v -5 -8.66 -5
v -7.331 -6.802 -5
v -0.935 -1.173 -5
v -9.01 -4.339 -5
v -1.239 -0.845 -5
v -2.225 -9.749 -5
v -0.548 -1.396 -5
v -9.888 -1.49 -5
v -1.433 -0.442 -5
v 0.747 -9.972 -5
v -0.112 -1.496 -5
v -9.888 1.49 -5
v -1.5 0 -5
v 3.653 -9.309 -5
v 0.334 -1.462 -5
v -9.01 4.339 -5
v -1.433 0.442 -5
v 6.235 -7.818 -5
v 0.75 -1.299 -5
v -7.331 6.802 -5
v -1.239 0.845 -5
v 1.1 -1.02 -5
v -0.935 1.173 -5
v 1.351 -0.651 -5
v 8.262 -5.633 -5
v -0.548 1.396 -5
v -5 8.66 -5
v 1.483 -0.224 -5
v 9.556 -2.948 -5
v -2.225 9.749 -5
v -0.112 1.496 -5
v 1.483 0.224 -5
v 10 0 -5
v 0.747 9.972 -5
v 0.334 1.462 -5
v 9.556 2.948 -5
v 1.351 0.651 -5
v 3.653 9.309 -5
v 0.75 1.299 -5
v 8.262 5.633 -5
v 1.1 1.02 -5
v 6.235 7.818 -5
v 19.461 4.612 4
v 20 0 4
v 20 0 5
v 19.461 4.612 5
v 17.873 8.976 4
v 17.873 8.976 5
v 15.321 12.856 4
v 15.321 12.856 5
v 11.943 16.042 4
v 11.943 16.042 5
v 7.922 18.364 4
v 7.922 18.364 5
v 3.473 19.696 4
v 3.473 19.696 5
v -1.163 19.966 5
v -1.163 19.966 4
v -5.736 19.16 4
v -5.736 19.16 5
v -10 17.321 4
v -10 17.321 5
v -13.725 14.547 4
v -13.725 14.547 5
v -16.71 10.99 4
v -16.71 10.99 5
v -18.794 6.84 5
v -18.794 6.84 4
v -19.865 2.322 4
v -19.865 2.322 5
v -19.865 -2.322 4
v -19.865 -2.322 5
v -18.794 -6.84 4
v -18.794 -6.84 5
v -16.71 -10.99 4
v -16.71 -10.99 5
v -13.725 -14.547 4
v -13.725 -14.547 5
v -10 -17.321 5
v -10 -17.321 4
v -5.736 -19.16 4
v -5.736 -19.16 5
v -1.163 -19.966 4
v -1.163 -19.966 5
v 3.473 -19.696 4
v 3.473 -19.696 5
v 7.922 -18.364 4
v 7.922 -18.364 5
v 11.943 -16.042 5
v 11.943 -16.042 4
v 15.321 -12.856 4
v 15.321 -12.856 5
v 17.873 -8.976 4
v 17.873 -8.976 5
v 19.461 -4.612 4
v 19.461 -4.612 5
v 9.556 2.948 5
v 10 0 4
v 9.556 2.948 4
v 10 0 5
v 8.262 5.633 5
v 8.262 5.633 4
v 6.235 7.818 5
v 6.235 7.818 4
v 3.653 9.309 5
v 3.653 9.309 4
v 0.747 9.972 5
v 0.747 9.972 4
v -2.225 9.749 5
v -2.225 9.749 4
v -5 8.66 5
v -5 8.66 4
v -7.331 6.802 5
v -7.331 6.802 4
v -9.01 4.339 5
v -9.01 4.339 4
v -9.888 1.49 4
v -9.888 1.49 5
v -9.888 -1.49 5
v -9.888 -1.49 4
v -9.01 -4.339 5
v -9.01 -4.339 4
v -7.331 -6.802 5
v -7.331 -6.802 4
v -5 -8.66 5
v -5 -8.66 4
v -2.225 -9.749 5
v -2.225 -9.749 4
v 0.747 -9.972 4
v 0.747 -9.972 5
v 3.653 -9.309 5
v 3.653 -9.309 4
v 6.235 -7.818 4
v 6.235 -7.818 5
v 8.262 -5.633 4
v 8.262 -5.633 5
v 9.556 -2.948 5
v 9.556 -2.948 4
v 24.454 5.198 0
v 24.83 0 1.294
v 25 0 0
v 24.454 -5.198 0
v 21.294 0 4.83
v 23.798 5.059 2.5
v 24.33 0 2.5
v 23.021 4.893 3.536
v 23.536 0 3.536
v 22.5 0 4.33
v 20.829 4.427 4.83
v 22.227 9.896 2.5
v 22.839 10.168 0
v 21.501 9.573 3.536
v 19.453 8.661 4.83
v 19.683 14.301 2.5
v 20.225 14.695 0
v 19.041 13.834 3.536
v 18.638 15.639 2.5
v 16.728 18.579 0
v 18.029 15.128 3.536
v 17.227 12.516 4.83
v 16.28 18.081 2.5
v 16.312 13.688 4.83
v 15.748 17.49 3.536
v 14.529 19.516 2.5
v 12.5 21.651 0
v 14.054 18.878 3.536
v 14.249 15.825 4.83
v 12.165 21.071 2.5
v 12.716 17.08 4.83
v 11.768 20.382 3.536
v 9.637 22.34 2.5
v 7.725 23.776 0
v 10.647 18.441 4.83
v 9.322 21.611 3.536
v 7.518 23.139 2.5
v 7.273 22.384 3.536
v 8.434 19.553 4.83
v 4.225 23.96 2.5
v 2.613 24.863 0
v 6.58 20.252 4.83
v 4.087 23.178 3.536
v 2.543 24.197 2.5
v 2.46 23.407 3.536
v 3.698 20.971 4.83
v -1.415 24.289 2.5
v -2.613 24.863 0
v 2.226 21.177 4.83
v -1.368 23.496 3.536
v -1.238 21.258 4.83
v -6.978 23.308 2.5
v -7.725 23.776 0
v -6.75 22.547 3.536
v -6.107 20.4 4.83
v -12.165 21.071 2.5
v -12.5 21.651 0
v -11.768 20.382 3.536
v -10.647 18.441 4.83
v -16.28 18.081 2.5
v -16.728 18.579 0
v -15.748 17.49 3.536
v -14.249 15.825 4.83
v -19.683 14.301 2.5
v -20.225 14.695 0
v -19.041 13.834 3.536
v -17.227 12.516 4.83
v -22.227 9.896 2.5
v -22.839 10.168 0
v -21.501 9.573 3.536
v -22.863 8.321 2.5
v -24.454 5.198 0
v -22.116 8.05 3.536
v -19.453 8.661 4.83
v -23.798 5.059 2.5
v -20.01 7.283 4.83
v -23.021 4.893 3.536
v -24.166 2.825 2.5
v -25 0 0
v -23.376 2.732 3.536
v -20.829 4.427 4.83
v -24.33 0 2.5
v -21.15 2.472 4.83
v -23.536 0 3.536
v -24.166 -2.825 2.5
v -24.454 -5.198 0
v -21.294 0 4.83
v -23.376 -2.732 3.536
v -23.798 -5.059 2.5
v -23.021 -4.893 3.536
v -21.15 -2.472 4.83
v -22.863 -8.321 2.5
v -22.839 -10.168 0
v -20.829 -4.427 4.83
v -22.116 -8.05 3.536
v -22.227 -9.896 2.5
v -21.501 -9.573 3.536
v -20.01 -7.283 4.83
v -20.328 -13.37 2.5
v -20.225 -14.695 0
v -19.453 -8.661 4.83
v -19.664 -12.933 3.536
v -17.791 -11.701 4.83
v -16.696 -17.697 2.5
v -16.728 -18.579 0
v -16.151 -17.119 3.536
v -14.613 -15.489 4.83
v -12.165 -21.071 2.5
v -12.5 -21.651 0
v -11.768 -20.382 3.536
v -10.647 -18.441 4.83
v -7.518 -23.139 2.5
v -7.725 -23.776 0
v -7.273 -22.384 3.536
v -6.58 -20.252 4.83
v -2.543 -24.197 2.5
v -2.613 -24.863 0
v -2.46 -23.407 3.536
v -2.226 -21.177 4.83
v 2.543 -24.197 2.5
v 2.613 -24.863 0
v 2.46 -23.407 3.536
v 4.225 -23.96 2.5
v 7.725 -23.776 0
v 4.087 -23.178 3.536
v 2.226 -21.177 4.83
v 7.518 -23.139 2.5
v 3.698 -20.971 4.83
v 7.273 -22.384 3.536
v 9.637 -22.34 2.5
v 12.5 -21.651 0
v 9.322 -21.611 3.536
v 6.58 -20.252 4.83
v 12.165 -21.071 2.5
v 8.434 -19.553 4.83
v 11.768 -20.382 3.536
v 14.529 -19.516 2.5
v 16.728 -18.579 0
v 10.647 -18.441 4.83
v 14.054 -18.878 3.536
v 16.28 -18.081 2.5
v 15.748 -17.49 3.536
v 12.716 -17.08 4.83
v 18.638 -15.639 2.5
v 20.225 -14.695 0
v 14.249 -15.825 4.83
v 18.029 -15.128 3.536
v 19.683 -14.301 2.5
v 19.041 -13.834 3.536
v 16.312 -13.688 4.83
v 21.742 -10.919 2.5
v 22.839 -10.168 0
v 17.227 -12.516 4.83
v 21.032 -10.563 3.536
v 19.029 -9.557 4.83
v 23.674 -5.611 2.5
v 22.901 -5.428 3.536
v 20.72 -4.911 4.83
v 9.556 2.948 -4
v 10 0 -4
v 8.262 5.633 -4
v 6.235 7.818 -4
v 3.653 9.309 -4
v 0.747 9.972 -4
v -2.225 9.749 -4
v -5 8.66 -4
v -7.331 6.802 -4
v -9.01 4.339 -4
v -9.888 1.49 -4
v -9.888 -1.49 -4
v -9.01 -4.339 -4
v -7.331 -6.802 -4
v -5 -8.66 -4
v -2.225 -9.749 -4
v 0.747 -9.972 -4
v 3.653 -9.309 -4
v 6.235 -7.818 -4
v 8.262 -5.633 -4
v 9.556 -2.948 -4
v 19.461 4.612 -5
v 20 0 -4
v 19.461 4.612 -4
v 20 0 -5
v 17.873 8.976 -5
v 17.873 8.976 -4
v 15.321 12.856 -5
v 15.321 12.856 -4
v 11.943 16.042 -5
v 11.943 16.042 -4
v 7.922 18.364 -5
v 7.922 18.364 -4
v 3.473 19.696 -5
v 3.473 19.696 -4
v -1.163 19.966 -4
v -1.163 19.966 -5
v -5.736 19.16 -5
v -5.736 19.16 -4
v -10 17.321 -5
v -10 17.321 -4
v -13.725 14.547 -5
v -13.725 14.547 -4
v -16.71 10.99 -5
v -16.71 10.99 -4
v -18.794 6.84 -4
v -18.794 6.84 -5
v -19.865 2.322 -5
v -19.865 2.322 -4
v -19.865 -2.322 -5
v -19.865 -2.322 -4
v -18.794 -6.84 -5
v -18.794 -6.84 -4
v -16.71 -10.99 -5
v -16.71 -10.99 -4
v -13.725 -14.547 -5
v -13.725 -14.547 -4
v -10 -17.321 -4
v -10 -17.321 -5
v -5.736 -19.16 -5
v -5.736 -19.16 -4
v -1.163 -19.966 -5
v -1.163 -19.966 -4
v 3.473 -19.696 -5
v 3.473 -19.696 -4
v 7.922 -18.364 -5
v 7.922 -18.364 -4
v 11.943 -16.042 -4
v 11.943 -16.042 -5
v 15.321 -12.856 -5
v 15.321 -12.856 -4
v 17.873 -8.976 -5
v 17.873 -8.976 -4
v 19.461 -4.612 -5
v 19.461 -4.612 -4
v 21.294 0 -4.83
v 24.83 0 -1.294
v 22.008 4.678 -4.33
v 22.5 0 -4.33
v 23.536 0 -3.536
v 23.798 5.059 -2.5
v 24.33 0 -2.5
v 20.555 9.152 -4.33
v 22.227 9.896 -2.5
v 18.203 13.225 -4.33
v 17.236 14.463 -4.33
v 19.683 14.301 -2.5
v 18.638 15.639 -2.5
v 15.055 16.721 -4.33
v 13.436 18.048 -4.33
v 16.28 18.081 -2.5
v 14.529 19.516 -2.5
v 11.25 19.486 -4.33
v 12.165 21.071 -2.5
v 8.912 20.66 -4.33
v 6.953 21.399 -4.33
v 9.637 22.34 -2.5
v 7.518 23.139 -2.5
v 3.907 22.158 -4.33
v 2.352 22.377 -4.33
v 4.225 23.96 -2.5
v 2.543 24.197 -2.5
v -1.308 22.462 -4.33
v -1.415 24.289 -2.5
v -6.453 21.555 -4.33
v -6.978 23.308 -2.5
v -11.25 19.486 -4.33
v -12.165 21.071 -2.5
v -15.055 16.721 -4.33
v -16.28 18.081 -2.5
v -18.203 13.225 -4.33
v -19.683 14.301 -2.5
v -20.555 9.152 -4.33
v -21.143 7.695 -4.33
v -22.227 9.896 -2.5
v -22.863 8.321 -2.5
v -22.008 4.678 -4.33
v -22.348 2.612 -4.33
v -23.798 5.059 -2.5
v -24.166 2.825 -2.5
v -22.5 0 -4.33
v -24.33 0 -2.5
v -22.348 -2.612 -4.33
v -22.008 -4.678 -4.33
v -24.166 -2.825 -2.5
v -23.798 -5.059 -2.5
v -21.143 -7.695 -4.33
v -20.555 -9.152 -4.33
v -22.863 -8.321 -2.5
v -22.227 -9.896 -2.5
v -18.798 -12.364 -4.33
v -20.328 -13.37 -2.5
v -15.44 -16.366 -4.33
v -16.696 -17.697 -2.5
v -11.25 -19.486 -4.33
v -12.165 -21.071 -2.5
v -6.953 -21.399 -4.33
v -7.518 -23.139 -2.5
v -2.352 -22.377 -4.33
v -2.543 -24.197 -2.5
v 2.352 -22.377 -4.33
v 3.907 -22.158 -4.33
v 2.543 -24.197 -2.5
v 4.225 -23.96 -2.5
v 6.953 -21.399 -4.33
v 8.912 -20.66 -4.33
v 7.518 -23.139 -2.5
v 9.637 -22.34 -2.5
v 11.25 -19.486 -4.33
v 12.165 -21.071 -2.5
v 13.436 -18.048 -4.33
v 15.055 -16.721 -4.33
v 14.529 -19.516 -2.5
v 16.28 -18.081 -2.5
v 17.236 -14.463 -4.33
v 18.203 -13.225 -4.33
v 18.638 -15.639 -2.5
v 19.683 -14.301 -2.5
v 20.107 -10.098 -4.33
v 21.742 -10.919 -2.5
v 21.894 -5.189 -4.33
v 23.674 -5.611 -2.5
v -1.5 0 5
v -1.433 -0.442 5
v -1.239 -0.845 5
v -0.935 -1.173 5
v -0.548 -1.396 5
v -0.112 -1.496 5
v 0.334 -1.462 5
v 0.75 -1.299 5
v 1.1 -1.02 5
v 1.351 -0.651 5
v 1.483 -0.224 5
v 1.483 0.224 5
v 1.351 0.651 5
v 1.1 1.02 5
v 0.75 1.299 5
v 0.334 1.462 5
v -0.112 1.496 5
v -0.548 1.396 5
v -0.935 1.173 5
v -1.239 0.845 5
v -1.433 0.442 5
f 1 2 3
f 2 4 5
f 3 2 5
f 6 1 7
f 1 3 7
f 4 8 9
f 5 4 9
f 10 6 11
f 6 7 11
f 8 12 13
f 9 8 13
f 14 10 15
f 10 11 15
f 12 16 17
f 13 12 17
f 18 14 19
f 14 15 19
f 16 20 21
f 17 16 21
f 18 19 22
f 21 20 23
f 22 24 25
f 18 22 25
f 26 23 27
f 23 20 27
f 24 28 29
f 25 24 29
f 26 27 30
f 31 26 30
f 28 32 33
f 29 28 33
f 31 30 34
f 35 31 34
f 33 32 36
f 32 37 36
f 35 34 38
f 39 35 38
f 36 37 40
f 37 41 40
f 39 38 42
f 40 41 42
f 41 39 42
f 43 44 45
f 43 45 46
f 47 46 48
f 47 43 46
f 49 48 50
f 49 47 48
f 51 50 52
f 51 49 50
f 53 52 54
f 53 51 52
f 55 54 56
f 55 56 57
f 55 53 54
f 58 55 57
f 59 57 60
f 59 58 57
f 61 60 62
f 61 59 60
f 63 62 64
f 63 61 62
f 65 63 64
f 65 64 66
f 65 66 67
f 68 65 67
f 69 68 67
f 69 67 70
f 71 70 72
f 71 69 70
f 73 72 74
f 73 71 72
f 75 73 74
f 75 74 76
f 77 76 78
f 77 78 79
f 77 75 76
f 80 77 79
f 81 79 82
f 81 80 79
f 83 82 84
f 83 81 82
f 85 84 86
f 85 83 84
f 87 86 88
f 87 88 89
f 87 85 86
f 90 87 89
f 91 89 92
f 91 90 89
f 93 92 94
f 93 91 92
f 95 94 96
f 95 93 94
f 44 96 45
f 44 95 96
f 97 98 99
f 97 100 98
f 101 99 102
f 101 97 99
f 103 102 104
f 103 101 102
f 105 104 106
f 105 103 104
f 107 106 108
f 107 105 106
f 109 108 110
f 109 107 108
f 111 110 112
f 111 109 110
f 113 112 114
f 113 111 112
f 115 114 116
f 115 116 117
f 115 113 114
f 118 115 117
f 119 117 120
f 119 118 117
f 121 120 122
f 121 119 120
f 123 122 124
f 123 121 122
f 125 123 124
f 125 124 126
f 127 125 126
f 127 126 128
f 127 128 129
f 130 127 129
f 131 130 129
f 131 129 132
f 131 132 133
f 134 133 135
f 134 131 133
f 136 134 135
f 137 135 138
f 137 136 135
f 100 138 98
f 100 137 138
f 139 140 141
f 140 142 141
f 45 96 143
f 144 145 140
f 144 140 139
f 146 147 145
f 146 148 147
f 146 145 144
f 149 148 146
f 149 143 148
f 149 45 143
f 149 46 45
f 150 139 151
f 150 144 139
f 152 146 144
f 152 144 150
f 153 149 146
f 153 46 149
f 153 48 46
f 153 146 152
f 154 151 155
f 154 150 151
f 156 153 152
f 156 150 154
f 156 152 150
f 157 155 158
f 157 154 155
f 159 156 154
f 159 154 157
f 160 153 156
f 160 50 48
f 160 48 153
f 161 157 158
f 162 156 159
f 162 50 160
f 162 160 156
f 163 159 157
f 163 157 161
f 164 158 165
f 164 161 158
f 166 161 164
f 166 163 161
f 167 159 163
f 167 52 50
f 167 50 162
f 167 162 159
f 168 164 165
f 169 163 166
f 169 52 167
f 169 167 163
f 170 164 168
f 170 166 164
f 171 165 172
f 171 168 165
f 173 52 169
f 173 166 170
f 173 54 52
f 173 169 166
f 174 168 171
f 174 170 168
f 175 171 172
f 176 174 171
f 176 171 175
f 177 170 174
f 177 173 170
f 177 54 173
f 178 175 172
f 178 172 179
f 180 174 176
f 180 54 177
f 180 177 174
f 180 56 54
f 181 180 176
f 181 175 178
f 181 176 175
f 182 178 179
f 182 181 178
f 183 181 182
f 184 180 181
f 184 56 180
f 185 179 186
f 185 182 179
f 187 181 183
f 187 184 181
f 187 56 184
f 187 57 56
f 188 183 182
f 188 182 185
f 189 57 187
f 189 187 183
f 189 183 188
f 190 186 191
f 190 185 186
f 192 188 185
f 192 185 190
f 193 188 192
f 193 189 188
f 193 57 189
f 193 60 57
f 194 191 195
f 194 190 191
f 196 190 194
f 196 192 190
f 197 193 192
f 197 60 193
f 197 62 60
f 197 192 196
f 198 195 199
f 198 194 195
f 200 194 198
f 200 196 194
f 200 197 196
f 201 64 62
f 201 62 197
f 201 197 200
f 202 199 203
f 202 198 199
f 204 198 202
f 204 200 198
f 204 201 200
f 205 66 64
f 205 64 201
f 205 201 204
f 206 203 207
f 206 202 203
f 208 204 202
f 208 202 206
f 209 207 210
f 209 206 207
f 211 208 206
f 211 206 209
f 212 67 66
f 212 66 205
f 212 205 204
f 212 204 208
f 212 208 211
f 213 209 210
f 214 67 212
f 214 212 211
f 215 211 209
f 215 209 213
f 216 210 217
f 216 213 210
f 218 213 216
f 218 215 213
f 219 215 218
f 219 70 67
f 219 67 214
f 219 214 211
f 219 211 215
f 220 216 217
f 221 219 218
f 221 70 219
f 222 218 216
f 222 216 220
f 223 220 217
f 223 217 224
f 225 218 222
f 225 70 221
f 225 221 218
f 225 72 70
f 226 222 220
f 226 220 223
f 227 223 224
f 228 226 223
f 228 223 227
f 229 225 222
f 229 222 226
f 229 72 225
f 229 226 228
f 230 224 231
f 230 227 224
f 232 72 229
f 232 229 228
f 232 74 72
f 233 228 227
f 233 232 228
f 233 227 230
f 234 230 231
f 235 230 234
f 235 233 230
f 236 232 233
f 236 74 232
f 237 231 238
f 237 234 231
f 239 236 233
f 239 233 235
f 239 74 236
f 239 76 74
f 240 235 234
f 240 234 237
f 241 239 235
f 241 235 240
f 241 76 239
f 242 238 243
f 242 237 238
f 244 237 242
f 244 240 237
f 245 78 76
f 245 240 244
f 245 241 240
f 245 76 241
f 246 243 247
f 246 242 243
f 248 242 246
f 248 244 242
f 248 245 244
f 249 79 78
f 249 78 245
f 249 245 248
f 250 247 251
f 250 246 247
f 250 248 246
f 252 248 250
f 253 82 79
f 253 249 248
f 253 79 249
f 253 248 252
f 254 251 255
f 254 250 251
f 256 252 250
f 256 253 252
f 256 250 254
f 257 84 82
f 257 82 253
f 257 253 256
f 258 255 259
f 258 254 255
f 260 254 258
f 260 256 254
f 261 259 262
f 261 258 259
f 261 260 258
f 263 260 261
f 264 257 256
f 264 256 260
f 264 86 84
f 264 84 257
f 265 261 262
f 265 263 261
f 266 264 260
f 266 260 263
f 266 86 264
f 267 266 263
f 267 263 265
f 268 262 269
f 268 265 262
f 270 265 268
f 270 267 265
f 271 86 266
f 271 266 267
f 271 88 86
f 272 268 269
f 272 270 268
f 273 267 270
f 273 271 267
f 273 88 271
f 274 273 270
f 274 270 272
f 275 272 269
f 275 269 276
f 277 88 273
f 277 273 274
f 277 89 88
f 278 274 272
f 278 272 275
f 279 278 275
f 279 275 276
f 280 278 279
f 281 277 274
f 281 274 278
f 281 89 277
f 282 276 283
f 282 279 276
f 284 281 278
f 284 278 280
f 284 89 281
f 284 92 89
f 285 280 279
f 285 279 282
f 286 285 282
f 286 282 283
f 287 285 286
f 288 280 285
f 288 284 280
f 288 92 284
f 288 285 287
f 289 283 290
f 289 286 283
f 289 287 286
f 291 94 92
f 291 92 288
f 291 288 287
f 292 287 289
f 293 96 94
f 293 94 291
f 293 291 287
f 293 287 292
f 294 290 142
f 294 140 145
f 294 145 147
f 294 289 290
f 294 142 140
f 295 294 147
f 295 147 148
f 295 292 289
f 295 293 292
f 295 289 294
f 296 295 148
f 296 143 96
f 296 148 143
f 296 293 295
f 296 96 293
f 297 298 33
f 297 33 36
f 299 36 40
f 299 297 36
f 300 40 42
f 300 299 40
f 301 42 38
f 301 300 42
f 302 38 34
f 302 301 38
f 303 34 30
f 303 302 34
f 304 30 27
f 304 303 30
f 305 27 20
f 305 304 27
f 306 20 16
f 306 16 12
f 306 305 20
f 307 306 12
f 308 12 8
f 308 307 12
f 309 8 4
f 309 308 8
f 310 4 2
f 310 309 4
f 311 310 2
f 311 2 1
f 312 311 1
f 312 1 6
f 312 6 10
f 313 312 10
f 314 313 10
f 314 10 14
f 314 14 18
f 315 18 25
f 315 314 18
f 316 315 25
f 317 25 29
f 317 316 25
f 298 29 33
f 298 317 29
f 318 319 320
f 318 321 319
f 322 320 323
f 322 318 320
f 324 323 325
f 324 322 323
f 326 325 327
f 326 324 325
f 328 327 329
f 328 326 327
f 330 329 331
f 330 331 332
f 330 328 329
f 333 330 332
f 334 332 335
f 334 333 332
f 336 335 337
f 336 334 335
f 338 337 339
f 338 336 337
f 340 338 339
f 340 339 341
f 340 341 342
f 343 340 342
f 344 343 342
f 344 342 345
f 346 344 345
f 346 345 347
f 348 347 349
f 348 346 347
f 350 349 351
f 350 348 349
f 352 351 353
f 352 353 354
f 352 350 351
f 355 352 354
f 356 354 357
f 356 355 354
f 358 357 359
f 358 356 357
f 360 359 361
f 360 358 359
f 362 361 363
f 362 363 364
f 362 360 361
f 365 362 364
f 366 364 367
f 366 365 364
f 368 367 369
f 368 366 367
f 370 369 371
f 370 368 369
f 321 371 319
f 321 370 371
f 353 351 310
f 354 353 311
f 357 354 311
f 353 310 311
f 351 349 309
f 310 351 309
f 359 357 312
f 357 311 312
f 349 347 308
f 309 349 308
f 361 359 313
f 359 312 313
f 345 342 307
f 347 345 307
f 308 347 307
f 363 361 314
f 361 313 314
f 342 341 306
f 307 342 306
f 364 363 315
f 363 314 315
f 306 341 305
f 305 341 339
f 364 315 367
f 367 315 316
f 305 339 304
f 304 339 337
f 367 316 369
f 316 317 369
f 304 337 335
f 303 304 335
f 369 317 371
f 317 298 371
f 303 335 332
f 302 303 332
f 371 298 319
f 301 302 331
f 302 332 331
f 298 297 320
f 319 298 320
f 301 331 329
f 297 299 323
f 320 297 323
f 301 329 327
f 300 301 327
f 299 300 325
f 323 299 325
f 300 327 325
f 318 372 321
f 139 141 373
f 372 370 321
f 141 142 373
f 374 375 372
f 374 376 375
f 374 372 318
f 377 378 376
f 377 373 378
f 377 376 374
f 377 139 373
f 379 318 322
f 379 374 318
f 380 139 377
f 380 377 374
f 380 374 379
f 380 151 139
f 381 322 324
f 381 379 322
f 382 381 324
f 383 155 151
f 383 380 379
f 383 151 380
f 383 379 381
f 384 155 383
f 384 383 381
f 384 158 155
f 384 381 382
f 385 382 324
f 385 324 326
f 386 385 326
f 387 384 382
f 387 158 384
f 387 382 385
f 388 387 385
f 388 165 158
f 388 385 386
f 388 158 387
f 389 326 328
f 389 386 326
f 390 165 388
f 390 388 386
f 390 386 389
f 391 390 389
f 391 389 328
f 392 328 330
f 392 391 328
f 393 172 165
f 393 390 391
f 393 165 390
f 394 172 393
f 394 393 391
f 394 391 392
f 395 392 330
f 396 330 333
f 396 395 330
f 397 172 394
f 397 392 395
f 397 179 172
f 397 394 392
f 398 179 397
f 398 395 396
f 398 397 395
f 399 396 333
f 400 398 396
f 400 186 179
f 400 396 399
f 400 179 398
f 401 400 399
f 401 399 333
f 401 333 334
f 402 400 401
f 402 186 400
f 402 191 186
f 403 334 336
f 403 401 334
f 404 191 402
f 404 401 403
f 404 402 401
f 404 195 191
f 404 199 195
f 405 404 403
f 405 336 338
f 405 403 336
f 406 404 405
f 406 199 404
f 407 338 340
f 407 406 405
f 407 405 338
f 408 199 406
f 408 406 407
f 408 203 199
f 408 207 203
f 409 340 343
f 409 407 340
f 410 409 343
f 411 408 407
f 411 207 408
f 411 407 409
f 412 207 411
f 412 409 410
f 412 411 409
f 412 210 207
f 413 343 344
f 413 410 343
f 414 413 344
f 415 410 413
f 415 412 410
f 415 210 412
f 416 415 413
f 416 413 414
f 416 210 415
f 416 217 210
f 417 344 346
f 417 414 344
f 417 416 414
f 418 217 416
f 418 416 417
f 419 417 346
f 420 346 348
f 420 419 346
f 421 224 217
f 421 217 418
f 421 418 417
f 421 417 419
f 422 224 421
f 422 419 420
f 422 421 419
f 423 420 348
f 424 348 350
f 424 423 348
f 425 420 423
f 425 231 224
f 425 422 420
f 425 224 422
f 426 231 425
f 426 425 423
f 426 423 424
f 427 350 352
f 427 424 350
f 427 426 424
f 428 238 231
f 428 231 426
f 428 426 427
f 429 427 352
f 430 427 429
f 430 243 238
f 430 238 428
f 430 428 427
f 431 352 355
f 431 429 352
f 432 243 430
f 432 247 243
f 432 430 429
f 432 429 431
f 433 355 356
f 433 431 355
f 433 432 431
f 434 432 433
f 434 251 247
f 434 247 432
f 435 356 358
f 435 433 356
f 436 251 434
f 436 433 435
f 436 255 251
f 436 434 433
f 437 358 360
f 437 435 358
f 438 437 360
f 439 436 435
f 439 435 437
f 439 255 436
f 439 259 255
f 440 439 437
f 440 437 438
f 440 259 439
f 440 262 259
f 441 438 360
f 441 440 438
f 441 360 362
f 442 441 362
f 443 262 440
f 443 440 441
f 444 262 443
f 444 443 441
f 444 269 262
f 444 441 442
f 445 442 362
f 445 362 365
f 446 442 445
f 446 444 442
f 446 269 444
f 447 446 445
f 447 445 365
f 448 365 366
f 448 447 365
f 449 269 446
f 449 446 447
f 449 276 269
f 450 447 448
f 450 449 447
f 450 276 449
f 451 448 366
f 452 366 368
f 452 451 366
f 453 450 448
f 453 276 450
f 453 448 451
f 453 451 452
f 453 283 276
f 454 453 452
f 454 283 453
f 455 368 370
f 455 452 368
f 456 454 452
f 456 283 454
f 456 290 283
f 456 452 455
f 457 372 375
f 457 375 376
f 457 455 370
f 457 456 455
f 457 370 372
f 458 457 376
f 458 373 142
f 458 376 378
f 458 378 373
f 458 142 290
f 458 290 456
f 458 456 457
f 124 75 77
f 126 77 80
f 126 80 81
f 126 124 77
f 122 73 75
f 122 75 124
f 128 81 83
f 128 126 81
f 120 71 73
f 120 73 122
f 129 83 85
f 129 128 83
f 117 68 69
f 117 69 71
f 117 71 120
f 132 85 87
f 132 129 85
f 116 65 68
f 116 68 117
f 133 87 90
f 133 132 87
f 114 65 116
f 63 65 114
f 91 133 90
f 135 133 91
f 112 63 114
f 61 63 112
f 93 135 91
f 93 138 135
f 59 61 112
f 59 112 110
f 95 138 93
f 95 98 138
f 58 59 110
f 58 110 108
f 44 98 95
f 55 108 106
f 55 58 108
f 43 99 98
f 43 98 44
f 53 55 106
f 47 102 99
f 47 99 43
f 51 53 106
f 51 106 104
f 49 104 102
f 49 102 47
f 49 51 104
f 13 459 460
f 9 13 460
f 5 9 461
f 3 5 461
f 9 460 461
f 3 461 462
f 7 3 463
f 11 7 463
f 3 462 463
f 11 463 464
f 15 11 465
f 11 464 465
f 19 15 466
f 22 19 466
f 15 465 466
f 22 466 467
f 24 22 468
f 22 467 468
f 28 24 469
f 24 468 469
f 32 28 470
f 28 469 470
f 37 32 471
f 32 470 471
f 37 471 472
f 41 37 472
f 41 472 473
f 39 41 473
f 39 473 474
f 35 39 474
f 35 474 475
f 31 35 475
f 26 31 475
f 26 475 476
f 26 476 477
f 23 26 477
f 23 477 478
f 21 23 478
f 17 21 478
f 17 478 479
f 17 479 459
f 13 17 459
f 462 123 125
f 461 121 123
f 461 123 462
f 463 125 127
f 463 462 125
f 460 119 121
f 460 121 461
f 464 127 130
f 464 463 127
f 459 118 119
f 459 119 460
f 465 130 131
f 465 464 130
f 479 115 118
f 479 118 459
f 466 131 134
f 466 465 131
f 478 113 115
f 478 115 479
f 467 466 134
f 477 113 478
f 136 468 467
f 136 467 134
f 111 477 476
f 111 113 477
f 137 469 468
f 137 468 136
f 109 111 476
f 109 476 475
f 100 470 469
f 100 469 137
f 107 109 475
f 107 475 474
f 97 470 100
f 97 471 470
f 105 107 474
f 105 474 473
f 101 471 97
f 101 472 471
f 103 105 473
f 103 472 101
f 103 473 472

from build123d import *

# Parameters (mm, degrees)
F0_R     = 25
F0_R_2   = 20
F1_DEPTH = 5
F0_R_3   = 10
F2_DEPTH = 4
F3_R     = 4.99999
F5_D     = 3
F5_DEPTH = 250
F5_TIP   = 0.9012909285


# Not quite as in the source:
# - a fillet or chamfer is up to 0.001 mm smaller than in the source, because OpenCascade refuses the exact size


with BuildPart() as f1:
    # F0 (on Top) → F1 (new body, symmetric)
    with BuildSketch(Plane.XY):
        Circle(F0_R)
        Circle(F0_R_2, mode=Mode.SUBTRACT)
    extrude(amount=F1_DEPTH, both=True)



with BuildPart() as f1b:
    # F0 (on Top) → F1, piece 2 (new body, symmetric)
    with BuildSketch(Plane.XY):
        Circle(F0_R_3)
    extrude(amount=F1_DEPTH, both=True)


with BuildPart() as f1_1:
    add(f1.part)

    add(f1b.part)  # F2 merges F1b
    # F0 (on Top) → F2 (join, symmetric)
    with BuildSketch(Plane.XY):
        Circle(F0_R_2)
        Circle(F0_R_3, mode=Mode.SUBTRACT)
    extrude(amount=F2_DEPTH, both=True)

    # F3 (radius 5 in the source; OpenCascade refuses exactly that, so slightly less here)
    f3_edges = [f1_1.edges().sort_by_distance(p)[0] for p in [
        (-25, 0, 5),
        (-25, 0, -5),
    ]]
    fillet(f3_edges, radius=F3_R)

    # F5
    with Locations(Plane(origin=(0, 0, -5), x_dir=(1, 0, 0), z_dir=(0, 0, -1))):
        with Locations((0, 0)):
            Hole(F5_D / 2, depth=F5_DEPTH)
            with Locations((0, 0, -(F5_DEPTH + F5_TIP / 2))):  # 118° drill point
                Cone(0, F5_D / 2, F5_TIP, mode=Mode.SUBTRACT)


solid = f1_1.part
